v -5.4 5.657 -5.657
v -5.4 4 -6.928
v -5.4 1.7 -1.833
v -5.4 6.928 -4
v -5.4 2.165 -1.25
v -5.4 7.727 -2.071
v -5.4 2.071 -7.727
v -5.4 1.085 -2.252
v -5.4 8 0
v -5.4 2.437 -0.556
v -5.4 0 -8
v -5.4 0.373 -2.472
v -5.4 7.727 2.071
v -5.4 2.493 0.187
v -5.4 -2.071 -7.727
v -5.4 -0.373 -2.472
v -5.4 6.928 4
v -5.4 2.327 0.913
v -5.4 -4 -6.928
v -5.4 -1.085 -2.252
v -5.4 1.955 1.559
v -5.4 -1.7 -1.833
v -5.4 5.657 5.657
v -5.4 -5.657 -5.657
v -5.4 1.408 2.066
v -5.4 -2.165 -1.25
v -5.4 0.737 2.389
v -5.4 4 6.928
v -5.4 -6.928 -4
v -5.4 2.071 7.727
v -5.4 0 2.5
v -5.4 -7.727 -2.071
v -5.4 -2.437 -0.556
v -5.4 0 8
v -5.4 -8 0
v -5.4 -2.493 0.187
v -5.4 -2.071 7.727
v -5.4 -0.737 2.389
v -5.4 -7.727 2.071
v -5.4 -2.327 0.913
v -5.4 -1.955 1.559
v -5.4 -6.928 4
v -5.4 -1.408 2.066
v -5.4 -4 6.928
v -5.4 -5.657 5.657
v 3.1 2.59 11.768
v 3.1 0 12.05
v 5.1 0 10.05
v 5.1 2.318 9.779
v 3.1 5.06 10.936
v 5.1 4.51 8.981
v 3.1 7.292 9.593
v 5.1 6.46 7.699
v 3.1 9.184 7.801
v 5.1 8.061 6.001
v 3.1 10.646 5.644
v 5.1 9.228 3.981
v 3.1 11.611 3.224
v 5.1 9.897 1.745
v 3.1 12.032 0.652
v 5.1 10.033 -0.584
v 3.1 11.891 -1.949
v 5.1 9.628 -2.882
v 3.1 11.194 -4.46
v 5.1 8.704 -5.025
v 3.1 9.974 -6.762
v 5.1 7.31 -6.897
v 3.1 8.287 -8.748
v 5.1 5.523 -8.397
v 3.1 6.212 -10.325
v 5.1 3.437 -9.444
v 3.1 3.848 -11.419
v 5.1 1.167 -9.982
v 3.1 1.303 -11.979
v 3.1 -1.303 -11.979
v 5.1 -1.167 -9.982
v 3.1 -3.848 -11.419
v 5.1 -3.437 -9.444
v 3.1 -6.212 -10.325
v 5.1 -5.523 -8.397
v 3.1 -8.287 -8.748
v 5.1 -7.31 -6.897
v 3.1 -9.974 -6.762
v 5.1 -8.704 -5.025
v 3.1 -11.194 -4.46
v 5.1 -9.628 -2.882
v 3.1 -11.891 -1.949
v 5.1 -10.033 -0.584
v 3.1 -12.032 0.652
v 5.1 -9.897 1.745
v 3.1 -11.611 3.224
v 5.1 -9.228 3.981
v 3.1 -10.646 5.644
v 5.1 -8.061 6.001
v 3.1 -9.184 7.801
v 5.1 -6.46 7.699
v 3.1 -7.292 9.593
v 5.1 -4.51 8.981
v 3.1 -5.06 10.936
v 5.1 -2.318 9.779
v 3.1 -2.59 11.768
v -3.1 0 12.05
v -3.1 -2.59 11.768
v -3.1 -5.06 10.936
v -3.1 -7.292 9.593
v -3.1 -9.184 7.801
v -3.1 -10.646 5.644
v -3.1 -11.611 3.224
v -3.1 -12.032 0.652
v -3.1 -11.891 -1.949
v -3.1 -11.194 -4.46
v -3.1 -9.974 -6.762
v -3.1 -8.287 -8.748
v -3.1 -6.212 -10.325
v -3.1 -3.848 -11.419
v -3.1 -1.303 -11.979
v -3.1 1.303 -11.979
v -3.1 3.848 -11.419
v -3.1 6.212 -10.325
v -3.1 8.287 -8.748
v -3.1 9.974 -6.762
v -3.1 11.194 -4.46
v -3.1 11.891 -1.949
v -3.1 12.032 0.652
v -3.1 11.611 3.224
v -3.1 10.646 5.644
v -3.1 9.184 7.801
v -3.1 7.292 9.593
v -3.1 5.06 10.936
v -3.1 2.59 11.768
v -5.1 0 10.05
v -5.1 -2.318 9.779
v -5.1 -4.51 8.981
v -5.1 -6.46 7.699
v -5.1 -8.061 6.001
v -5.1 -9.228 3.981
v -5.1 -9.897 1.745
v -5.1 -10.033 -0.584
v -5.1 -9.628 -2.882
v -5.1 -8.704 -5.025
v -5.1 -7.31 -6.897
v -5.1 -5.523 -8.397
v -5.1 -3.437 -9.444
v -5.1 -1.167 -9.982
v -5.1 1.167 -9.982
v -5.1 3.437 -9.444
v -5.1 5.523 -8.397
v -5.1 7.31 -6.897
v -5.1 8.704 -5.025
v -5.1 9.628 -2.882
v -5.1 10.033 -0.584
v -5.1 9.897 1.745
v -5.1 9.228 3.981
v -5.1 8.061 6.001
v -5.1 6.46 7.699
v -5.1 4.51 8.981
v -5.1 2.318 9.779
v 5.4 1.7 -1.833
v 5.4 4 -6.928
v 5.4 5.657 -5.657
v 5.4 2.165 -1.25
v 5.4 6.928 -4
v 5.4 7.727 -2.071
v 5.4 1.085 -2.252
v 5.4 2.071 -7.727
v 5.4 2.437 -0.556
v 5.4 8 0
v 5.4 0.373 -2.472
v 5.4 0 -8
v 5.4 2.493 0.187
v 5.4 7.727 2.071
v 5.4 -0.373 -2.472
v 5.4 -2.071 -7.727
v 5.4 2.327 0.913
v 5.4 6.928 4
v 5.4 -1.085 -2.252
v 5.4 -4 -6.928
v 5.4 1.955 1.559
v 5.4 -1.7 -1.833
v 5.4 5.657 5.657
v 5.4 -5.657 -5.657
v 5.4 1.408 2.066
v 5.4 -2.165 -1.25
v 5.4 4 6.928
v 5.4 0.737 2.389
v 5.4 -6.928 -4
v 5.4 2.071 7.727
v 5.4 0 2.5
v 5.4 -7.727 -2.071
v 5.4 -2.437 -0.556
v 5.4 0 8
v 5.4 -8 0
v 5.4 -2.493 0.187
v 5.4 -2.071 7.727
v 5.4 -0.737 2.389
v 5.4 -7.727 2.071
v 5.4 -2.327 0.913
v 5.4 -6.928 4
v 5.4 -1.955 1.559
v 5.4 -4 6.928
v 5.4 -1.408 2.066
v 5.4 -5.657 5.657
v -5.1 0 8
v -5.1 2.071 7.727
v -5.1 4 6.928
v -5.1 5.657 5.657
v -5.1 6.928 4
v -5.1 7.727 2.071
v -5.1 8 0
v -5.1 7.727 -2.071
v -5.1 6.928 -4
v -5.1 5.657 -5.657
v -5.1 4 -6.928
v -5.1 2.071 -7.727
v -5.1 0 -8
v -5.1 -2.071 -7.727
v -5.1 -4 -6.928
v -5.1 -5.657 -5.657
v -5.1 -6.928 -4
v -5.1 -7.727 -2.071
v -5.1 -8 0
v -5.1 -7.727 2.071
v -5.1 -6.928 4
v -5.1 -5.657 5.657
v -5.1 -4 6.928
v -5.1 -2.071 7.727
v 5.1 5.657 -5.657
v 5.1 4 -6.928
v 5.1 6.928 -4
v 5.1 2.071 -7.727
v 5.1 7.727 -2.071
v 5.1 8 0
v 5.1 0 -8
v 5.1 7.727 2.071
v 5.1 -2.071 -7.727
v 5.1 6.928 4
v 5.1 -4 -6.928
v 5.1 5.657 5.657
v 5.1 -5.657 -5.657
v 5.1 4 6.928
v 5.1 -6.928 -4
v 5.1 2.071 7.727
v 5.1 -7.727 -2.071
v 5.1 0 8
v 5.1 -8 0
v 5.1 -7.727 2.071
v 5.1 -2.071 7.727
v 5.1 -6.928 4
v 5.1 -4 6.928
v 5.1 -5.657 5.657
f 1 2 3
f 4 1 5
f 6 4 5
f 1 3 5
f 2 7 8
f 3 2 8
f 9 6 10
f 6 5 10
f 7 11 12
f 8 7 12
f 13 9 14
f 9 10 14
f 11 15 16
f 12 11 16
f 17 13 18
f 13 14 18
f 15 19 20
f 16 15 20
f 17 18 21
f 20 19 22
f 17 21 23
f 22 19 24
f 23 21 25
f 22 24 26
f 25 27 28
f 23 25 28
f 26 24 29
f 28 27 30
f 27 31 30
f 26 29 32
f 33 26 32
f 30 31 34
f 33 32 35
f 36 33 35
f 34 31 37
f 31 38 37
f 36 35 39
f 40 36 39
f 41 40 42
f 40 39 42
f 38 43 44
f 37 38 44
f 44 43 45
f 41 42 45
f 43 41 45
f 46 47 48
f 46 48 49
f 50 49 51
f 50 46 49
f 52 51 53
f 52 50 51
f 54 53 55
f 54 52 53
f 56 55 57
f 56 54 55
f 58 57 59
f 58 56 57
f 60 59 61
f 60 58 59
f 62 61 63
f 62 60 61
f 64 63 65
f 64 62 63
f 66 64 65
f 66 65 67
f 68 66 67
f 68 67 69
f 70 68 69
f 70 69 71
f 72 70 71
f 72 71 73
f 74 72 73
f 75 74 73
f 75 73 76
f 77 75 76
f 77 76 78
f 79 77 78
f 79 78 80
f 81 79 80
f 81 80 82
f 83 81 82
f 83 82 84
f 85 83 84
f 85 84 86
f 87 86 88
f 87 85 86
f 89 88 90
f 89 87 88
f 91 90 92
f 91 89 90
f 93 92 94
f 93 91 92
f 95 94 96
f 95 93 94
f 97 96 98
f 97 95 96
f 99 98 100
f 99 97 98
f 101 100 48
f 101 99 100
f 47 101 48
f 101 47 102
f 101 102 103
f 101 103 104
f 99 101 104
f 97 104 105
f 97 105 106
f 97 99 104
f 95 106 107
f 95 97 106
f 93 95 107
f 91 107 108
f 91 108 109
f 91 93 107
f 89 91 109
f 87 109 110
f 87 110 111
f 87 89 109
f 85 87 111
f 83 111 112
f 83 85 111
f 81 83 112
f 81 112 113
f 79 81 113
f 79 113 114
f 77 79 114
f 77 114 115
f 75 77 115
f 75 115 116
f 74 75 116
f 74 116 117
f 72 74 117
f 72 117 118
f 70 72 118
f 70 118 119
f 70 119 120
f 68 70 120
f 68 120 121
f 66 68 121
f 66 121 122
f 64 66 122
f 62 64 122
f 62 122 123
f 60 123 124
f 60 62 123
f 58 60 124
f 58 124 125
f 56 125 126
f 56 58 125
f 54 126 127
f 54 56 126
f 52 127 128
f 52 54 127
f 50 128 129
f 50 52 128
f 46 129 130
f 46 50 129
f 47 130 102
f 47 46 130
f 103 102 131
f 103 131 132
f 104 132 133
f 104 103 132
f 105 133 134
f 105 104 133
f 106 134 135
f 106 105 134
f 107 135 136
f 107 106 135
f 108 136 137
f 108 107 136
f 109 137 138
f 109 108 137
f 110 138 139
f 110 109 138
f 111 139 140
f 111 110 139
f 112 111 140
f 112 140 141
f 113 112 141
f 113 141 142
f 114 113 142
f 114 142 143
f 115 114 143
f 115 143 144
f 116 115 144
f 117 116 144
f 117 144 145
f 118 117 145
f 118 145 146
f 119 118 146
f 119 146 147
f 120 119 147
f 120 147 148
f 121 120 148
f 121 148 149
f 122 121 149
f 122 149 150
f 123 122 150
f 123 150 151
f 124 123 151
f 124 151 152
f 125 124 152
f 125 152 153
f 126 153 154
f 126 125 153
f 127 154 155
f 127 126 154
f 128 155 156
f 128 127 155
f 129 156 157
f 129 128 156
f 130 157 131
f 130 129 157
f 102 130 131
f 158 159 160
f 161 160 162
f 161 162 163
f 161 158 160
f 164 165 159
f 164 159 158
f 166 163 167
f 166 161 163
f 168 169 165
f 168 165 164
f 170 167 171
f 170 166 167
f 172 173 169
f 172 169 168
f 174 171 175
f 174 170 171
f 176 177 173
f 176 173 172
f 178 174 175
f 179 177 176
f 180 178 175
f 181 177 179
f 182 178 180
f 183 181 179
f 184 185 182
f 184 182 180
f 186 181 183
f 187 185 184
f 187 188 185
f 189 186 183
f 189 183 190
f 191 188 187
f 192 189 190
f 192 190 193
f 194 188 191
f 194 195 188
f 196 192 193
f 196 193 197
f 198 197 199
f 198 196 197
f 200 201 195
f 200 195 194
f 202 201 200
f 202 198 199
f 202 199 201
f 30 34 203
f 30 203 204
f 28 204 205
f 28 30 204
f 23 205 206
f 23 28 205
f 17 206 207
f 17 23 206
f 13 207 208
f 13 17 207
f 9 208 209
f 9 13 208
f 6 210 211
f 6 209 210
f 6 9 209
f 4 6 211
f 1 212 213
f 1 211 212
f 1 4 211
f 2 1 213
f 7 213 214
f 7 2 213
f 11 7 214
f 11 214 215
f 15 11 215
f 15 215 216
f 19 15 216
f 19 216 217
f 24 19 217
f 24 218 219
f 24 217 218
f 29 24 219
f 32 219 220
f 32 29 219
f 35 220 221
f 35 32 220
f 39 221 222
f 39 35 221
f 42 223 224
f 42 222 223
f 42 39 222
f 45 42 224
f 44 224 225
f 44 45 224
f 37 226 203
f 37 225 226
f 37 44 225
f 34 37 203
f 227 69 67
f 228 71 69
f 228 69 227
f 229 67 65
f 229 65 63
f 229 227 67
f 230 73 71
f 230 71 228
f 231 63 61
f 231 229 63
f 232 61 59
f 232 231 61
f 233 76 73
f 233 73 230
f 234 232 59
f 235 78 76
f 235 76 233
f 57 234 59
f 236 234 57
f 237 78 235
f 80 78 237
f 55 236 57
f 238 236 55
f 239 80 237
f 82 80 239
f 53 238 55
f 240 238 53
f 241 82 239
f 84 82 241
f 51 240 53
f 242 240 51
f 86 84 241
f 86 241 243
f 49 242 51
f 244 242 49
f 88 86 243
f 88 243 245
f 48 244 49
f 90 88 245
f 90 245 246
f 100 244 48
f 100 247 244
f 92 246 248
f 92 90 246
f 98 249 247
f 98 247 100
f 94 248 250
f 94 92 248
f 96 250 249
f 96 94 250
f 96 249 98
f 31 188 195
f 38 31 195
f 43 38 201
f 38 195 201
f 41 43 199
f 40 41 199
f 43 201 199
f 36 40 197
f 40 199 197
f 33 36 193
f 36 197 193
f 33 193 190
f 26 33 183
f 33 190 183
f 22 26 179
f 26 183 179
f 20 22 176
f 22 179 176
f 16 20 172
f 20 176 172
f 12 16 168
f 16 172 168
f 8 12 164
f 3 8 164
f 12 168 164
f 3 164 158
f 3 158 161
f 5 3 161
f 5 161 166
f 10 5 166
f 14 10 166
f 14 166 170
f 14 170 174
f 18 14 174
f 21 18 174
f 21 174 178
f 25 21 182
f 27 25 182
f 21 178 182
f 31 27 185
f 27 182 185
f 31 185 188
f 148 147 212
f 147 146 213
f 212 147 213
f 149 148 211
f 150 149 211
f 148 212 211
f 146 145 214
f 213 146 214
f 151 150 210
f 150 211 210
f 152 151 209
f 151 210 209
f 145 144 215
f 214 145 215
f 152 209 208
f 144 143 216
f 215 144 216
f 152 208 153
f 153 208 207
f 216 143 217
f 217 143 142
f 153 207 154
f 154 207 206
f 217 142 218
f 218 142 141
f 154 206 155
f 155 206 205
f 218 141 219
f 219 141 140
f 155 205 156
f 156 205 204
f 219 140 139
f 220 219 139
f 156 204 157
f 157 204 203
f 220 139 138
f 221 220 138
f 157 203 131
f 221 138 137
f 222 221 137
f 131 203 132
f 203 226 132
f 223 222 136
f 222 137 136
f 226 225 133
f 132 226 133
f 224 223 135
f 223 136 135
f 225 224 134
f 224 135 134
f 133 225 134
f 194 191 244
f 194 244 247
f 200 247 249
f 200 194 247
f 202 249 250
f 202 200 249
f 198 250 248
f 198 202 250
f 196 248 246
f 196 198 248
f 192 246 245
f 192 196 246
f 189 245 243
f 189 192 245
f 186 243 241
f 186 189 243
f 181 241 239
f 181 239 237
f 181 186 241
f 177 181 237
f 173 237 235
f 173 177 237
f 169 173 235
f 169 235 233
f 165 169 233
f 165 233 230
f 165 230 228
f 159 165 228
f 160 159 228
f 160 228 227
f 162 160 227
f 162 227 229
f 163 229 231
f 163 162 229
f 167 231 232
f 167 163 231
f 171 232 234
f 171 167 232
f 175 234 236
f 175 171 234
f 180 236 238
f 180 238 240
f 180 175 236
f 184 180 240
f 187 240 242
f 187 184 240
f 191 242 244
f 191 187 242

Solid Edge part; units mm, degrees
sketch "Sketch1" plane through (0, 0, 0) normal (0, -1, 0) x (1, 0, 0)
  line L0 (-5.1, 8) -> (-5.1, 12.05)
  line L1 (-5.1, 12.05) -> (5.1, 12.05)
  line L2 (5.1, 12.05) -> (5.1, 8)
  line L3 (5.1, 8) -> (5.4, 8)
  line L4 (5.4, 8) -> (5.4, 2.5)
  line L5 (-5.4, 2.5) -> (5.4, 2.5)
  line L6 (-5.4, 8) -> (-5.4, 2.5)
  line L7 (-5.1, 8) -> (-5.4, 8)
  dimension "D1" = 10.2
  dimension "D2" = 0.3
revolve "RevolvedProtrusion1" add sketch "Sketch1" angle 360 about axis through (0, 0, 0) along (1, 0, 0)
chamfer "Chamfer1" distance 2 angle 45 2 edges at (-5.1, 0, -12.05) (5.1, 0, -12.05)
